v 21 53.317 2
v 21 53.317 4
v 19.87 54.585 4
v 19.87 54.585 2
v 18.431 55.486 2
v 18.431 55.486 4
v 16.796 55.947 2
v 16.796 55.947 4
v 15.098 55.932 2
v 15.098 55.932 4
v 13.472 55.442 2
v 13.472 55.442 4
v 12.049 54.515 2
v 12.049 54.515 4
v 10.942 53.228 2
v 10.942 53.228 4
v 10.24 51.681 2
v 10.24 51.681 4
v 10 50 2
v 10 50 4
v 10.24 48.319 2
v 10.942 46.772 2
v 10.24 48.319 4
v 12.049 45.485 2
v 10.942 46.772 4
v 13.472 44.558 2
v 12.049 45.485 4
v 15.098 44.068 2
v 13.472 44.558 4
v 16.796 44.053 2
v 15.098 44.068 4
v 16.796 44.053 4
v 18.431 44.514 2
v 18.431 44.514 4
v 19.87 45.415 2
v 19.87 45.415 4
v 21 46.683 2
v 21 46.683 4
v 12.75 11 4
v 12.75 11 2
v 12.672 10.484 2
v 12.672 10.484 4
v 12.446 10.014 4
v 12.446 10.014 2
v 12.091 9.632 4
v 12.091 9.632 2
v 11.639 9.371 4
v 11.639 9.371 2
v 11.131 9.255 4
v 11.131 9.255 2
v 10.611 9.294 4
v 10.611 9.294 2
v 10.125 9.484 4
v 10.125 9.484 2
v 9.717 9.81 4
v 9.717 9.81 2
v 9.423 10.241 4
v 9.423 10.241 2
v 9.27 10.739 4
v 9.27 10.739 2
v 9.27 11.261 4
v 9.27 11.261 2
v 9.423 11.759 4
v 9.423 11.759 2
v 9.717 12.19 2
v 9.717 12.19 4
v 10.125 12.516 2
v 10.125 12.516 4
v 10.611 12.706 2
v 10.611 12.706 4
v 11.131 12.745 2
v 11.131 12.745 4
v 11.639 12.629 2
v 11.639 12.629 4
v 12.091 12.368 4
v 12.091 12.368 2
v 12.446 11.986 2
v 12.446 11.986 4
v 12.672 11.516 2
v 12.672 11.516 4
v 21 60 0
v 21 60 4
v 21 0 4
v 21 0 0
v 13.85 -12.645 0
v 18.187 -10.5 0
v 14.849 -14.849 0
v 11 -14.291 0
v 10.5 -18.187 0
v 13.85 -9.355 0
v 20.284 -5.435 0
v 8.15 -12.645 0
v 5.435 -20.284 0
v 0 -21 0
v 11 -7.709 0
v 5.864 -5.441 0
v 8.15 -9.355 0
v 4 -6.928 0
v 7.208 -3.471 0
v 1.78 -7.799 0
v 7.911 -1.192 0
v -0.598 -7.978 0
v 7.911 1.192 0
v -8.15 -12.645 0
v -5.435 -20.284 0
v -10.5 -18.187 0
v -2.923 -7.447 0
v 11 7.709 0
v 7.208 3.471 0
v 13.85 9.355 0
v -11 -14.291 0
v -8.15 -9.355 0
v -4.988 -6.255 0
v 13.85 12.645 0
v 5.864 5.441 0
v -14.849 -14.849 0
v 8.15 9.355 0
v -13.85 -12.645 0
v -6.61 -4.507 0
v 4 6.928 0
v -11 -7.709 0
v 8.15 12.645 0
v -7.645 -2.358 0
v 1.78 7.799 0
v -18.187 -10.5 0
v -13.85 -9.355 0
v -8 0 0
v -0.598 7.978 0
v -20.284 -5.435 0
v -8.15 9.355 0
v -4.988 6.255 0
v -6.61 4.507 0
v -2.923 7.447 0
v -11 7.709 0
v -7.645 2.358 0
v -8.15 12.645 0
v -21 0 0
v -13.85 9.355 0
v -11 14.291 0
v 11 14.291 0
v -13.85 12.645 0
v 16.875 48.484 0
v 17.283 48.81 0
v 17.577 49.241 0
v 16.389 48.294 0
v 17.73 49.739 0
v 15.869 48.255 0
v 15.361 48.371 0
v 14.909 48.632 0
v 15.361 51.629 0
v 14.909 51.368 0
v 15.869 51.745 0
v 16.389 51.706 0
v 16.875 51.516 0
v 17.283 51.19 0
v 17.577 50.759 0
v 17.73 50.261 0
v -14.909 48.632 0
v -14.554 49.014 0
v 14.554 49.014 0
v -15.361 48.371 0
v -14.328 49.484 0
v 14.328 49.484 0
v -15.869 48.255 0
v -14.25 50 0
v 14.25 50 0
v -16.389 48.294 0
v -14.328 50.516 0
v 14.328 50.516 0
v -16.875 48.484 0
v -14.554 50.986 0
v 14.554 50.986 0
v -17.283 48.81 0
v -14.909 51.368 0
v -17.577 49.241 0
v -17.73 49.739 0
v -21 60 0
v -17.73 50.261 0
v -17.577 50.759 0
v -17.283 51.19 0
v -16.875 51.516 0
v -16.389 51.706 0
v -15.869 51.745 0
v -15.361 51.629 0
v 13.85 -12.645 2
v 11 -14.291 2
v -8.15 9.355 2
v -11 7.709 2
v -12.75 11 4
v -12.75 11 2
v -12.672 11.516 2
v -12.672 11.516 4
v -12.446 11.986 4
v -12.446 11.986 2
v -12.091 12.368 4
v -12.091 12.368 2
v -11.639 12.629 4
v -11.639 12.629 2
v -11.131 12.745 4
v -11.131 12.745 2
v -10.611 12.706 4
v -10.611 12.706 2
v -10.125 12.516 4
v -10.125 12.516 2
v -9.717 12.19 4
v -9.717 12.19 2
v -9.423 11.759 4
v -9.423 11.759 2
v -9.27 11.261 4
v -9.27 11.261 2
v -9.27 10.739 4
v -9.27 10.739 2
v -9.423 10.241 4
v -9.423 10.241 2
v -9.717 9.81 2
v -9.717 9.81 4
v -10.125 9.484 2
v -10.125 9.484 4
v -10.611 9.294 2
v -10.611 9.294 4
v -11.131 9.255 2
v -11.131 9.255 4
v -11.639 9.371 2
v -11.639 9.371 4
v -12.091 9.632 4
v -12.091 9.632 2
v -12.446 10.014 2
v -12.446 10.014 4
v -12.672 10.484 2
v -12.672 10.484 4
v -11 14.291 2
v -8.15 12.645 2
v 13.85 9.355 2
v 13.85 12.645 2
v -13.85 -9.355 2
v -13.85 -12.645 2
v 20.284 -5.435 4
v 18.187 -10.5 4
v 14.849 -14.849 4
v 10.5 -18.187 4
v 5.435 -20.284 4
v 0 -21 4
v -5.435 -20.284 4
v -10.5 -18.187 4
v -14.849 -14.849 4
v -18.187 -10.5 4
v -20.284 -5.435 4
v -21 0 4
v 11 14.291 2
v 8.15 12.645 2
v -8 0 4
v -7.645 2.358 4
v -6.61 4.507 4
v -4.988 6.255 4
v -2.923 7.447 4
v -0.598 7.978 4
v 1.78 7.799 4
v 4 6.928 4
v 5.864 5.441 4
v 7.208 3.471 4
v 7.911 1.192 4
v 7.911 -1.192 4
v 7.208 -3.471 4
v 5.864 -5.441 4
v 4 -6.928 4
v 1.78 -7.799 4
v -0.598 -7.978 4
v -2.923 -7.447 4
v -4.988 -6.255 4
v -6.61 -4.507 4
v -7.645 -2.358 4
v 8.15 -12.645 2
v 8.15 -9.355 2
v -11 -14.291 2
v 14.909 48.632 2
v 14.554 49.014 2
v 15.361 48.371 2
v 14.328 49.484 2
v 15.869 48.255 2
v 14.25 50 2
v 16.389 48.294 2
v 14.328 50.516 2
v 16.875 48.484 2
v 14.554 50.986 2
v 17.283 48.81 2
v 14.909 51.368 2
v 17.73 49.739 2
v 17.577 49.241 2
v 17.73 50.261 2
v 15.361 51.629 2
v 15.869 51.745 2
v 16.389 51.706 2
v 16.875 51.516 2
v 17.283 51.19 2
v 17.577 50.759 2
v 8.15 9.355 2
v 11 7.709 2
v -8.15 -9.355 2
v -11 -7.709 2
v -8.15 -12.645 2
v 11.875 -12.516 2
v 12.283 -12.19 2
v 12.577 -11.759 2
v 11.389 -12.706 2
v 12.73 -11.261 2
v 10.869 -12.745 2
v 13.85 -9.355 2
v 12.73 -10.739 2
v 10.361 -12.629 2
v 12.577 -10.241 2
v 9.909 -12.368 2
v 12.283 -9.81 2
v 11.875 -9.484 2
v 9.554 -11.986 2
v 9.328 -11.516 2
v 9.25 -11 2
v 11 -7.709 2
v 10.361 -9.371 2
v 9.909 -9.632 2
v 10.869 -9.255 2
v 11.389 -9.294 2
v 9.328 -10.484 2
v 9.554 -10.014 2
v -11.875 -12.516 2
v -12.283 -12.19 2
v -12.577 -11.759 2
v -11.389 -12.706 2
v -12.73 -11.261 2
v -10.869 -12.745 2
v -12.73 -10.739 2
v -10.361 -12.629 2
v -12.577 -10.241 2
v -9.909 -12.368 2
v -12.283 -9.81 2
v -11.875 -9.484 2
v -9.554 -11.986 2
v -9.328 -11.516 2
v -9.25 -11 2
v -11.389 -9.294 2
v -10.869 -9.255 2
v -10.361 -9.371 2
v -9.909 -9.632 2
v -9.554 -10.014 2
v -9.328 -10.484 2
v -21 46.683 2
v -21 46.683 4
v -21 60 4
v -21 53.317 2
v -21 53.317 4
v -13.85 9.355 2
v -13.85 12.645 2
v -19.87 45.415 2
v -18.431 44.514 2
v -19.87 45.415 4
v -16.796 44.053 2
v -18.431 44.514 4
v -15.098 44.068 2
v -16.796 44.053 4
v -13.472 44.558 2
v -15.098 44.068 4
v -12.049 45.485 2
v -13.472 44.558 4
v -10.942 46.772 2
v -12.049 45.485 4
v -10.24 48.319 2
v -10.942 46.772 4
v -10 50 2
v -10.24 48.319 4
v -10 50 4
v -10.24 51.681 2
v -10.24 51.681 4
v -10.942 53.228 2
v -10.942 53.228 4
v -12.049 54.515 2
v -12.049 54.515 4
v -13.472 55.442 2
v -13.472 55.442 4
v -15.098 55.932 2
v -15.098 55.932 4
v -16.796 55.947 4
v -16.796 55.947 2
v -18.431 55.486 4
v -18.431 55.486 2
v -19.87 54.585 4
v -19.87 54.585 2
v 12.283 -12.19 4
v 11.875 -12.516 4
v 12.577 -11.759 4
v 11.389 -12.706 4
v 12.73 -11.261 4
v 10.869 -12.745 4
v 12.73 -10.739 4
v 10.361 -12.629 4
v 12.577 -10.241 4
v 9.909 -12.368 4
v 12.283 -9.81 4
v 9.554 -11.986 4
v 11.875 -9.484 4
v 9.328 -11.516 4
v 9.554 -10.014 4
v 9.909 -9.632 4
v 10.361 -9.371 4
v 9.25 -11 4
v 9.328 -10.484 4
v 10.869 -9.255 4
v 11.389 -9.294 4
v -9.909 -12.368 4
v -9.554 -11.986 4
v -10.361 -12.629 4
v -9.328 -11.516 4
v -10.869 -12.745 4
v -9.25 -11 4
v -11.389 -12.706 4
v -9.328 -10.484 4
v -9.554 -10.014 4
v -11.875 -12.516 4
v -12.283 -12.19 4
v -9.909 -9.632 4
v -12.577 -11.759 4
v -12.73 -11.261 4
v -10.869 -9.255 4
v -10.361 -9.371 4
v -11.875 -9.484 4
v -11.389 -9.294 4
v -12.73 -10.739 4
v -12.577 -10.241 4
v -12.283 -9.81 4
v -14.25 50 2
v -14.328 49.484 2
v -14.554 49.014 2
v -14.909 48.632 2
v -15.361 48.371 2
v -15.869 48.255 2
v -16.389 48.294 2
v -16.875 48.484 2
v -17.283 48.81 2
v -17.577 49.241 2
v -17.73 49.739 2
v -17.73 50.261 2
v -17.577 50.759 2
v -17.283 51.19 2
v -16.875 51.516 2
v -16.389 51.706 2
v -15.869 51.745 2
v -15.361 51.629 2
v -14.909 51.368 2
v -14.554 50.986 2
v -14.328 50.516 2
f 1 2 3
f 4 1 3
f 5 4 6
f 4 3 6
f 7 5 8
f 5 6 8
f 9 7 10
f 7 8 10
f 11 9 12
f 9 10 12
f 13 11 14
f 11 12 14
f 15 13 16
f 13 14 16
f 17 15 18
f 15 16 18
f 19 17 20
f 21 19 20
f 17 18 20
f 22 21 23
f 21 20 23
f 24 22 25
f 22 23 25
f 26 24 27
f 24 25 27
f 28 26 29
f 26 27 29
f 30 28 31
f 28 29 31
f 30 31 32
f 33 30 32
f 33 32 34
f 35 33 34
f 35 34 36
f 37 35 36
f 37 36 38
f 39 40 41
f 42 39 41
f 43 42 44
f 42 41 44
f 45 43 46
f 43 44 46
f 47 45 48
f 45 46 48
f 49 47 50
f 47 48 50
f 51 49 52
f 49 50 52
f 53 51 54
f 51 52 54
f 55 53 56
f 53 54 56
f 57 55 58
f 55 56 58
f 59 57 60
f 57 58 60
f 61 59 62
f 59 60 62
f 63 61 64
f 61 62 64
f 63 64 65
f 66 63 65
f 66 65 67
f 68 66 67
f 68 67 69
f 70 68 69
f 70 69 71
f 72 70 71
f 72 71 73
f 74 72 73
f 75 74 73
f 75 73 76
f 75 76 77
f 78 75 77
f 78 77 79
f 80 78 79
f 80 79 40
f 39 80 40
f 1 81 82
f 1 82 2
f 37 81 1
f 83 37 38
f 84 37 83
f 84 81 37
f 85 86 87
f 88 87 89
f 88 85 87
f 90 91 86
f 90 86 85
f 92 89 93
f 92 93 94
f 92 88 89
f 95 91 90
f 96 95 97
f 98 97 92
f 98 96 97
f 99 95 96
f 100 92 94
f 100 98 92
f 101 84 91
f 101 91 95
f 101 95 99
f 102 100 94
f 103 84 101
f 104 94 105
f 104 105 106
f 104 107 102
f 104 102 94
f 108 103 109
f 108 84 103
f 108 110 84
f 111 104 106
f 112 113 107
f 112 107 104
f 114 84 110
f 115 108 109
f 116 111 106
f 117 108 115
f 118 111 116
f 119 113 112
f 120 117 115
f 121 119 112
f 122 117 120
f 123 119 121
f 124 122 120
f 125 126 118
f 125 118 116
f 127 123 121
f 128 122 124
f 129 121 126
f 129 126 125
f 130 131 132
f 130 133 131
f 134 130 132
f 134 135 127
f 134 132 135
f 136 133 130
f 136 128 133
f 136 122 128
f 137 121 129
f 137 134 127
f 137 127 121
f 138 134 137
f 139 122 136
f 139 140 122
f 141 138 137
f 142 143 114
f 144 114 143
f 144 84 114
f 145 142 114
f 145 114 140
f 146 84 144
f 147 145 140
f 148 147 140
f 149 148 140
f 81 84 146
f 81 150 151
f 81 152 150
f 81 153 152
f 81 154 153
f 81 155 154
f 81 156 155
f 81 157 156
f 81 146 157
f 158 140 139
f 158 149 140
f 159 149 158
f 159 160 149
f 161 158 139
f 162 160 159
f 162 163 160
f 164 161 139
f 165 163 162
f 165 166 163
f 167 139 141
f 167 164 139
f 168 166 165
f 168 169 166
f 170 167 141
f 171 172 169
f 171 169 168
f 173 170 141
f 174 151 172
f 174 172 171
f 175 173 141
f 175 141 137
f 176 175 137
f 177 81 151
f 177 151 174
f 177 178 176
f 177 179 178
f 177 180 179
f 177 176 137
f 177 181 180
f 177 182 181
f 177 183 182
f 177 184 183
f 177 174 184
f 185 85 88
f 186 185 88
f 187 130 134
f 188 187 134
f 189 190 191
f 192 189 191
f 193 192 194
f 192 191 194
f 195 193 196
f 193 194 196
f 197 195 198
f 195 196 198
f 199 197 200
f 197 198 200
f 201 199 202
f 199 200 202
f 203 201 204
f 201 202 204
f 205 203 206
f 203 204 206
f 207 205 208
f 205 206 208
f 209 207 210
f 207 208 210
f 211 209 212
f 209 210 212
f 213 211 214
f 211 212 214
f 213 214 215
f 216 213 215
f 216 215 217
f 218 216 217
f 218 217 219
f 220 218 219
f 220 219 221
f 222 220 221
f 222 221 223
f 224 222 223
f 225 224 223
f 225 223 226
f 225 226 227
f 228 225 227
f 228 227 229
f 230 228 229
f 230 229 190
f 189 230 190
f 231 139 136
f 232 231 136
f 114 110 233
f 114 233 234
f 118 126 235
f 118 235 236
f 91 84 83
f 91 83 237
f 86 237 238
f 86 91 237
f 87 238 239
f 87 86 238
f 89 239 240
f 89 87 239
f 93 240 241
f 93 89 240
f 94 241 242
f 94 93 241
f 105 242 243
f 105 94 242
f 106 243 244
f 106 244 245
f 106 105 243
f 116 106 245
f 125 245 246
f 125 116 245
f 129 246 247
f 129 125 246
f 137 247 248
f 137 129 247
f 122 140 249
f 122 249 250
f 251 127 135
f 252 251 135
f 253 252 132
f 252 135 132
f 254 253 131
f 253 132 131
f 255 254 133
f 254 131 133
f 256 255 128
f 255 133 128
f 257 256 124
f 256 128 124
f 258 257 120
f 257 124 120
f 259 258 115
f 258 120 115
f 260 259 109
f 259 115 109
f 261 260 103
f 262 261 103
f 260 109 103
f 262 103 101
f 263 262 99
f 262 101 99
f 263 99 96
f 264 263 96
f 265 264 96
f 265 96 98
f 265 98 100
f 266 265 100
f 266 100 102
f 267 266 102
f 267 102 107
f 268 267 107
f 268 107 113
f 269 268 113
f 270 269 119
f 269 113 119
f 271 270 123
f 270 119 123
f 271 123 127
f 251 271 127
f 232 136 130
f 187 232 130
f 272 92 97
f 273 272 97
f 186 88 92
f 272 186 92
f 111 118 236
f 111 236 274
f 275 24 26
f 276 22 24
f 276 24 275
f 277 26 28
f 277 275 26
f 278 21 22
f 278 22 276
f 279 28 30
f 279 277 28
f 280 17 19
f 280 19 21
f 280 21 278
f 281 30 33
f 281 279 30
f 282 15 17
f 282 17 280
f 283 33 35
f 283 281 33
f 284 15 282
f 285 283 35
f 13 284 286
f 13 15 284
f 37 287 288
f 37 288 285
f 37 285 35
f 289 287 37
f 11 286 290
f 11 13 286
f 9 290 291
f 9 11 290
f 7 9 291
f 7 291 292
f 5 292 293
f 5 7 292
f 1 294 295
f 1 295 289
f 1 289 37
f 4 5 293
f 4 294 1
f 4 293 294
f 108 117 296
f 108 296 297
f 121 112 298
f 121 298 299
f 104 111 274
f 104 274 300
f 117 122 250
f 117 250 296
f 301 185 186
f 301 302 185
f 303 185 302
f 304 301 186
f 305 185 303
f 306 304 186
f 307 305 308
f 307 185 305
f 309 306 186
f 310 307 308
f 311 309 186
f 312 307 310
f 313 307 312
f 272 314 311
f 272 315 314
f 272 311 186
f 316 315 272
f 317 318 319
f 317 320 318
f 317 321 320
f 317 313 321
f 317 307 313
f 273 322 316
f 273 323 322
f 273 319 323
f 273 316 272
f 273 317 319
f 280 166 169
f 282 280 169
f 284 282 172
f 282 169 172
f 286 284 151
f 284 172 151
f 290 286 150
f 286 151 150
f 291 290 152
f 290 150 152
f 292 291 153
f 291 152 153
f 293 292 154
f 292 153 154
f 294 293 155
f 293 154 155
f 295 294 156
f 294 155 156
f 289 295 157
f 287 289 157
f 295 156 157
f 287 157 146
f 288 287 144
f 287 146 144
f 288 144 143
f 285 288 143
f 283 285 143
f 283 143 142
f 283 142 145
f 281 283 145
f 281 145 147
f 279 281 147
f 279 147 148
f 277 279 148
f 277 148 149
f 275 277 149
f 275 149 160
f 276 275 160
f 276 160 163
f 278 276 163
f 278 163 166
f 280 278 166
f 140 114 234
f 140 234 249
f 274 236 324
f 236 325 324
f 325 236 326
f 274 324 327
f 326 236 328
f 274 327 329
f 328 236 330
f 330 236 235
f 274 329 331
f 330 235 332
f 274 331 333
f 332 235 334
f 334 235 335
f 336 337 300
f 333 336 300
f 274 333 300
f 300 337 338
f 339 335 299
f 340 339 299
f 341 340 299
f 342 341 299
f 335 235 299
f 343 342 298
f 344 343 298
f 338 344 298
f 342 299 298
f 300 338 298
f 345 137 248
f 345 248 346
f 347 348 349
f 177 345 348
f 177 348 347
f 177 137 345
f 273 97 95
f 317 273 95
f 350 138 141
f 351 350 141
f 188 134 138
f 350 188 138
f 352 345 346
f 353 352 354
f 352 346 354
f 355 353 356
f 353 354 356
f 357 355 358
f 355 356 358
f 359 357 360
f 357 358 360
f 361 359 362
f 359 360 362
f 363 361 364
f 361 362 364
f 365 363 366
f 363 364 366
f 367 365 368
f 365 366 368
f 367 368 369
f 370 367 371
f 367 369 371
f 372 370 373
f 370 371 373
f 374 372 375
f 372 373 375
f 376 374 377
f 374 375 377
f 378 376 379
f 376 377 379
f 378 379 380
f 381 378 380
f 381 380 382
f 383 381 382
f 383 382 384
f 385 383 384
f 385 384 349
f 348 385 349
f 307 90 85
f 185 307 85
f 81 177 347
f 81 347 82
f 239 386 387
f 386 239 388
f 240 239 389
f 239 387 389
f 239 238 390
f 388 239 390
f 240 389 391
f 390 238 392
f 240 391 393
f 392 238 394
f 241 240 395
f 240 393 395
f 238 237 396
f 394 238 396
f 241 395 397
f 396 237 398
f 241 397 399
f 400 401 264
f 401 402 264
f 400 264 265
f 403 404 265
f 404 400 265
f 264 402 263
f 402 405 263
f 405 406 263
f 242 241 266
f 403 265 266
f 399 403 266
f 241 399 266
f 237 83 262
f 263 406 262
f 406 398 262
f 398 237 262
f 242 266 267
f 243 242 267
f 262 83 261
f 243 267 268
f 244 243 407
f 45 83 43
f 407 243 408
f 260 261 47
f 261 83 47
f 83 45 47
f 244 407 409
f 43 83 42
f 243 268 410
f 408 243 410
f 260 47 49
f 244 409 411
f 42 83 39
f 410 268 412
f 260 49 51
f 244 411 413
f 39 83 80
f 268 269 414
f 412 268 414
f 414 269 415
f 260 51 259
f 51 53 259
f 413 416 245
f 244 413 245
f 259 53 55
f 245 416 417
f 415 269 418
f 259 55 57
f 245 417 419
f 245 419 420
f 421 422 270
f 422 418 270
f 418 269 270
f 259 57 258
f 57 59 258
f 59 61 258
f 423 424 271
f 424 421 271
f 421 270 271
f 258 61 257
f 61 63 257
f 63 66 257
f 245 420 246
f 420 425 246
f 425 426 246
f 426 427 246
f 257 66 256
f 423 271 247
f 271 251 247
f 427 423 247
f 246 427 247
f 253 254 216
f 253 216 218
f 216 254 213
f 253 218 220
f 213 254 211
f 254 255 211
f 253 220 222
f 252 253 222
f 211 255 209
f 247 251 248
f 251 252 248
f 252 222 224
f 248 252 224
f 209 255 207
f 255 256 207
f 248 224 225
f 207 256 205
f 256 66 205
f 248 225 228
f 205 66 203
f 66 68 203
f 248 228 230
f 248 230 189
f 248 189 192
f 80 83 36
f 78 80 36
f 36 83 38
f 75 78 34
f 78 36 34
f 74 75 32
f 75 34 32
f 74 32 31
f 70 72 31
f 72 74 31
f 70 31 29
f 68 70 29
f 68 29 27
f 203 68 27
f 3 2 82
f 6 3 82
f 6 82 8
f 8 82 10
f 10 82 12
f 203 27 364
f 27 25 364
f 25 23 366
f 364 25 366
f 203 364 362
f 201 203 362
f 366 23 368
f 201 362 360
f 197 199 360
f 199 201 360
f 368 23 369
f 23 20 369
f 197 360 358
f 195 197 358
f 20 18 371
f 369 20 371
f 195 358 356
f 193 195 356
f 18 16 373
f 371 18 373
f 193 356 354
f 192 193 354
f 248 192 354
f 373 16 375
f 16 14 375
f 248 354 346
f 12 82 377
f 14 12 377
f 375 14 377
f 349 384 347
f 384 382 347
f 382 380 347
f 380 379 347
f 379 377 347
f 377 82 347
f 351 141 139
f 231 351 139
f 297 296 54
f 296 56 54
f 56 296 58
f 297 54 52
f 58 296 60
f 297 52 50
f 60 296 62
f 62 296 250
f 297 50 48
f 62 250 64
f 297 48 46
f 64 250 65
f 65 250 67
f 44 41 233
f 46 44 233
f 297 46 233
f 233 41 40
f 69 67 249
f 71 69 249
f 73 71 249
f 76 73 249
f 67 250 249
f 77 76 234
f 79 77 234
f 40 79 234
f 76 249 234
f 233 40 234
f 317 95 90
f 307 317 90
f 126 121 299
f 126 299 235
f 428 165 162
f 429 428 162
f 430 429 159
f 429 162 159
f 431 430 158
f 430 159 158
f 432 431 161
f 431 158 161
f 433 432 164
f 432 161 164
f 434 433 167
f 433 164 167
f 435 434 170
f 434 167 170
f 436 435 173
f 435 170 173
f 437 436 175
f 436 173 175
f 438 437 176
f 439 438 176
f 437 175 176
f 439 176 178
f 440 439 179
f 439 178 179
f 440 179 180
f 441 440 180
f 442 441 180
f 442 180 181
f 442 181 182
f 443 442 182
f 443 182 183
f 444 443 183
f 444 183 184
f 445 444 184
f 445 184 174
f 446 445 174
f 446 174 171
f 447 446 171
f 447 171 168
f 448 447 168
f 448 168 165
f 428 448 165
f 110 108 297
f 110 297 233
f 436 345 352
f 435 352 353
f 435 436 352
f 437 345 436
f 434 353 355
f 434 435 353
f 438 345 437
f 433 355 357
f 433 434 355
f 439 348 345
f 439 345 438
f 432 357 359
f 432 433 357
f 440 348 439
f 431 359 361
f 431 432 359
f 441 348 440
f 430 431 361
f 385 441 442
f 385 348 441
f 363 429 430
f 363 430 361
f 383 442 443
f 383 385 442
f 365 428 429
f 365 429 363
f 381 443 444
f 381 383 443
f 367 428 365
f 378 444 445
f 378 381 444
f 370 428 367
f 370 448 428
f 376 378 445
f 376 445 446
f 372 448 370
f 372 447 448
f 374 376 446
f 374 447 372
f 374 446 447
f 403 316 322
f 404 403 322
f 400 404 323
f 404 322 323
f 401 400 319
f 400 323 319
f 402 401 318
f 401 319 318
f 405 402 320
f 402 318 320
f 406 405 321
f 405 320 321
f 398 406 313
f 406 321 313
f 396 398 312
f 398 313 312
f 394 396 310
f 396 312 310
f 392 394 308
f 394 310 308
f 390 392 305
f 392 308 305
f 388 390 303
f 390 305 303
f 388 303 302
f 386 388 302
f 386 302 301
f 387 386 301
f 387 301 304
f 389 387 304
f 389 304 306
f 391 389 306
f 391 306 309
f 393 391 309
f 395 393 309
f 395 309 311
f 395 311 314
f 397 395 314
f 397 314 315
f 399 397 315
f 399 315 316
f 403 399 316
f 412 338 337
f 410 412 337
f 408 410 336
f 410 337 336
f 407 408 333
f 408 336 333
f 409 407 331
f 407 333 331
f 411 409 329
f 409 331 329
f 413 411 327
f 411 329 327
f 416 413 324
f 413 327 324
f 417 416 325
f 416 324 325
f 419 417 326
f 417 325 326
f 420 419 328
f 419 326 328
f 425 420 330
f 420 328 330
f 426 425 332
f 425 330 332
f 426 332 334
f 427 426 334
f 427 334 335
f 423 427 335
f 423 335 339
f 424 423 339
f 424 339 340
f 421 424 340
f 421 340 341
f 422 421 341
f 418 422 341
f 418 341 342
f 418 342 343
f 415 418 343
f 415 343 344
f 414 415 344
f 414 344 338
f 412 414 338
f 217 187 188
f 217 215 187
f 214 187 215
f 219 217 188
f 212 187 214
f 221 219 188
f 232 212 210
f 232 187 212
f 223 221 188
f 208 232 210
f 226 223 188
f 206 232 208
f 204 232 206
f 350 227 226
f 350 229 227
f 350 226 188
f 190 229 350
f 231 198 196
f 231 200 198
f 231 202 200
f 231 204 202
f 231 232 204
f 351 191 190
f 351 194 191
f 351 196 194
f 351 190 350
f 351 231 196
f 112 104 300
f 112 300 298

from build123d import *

# Parameters (mm, degrees)
BOSS_EXTRUDE1_DEPTH = 4
SKETCH2_R           = 6
CUT_EXTRUDE1_DEPTH  = 64.694583757
SKETCH3_R           = 8
CUT_EXTRUDE2_DEPTH  = 4
SKETCH4_R           = 1.75
CUT_EXTRUDE3_DEPTH  = 64.694583757
CUT_EXTRUDE4_DEPTH  = 2
SKETCH6_R           = 1.75
CUT_EXTRUDE5_DEPTH  = 64.694583757
SKETCH7_R           = 6
CUT_EXTRUDE6_DEPTH  = 2


with BuildPart() as part:
    # Sketch1 → Boss-Extrude1 (new body)
    with BuildSketch(Plane.XY):
        with BuildLine():
            Line((-21, 0), (-21, 60))
            Line((-21, 60), (21, 60))
            Line((21, 60), (21, 0))
            ThreePointArc((21, 0), (0, -21), (-21, 0))
        make_face()
    extrude(amount=BOSS_EXTRUDE1_DEPTH)

    # Sketch2 → Cut-Extrude1 (cut, through all)
    with BuildSketch(Plane(origin=(0, 0, 0), x_dir=(-1, 0, 0), z_dir=(0, 0, -1))):
        Circle(SKETCH2_R)
    extrude(amount=-CUT_EXTRUDE1_DEPTH, mode=Mode.SUBTRACT)

    # Sketch3 → Cut-Extrude2 (cut)
    with BuildSketch(Plane(origin=(0, 0, 0), x_dir=(-1, 0, 0), z_dir=(0, 0, -1))):
        Circle(SKETCH3_R)
    extrude(amount=-CUT_EXTRUDE2_DEPTH, mode=Mode.SUBTRACT)

    # Sketch4 → Cut-Extrude3 (cut, through all)
    with BuildSketch(Plane(origin=(0, 0, 0), x_dir=(-1, 0, 0), z_dir=(0, 0, -1))):
        with Locations((-11, -11)):
            Circle(SKETCH4_R)
        with Locations(Location((-11, 11, 0), (0, 0, 180))):
            Circle(SKETCH4_R)
        with Locations((11, 11)):
            Circle(SKETCH4_R)
        with Locations(Location((11, -11, 0), (0, 0, 180))):
            Circle(SKETCH4_R)
    extrude(amount=-CUT_EXTRUDE3_DEPTH, mode=Mode.SUBTRACT)

    # Sketch5 → Cut-Extrude4 (cut)
    with BuildSketch(Plane(origin=(0, 0, 0), x_dir=(-1, 0, 0), z_dir=(0, 0, -1))):
        Polygon((-11, -7.709103466), (-13.85, -9.354551733), (-13.85, -12.645448267), (-11, -14.290896534), (-8.15, -12.645448267), (-8.15, -9.354551733), align=None)
        Polygon((-8.15, 9.354551733), (-11, 7.709103466), (-13.85, 9.354551733), (-13.85, 12.645448267), (-11, 14.290896534), (-8.15, 12.645448267), align=None)
        Polygon((11, 7.709103466), (13.85, 9.354551733), (13.85, 12.645448267), (11, 14.290896534), (8.15, 12.645448267), (8.15, 9.354551733), align=None)
        Polygon((8.15, -9.354551733), (11, -7.709103466), (13.85, -9.354551733), (13.85, -12.645448267), (11, -14.290896534), (8.15, -12.645448267), align=None)
    extrude(amount=-CUT_EXTRUDE4_DEPTH, mode=Mode.SUBTRACT)

    # Sketch6 → Cut-Extrude5 (cut, through all)
    with BuildSketch(Plane(origin=(0, 0, 0), x_dir=(-1, 0, 0), z_dir=(0, 0, -1))):
        with Locations((-16, 50)):
            Circle(SKETCH6_R)
        with Locations(Location((16, 50, 0), (0, 0, 180))):
            Circle(SKETCH6_R)
    extrude(amount=-CUT_EXTRUDE5_DEPTH, mode=Mode.SUBTRACT)

    # Sketch7 → Cut-Extrude6 (cut)
    with BuildSketch(Plane.XY.offset(4)):
        with Locations((-16, 50)):
            Circle(SKETCH7_R)
        with Locations((16, 50)):
            Circle(SKETCH7_R)
    extrude(amount=-CUT_EXTRUDE6_DEPTH, mode=Mode.SUBTRACT)


solid = part.part
